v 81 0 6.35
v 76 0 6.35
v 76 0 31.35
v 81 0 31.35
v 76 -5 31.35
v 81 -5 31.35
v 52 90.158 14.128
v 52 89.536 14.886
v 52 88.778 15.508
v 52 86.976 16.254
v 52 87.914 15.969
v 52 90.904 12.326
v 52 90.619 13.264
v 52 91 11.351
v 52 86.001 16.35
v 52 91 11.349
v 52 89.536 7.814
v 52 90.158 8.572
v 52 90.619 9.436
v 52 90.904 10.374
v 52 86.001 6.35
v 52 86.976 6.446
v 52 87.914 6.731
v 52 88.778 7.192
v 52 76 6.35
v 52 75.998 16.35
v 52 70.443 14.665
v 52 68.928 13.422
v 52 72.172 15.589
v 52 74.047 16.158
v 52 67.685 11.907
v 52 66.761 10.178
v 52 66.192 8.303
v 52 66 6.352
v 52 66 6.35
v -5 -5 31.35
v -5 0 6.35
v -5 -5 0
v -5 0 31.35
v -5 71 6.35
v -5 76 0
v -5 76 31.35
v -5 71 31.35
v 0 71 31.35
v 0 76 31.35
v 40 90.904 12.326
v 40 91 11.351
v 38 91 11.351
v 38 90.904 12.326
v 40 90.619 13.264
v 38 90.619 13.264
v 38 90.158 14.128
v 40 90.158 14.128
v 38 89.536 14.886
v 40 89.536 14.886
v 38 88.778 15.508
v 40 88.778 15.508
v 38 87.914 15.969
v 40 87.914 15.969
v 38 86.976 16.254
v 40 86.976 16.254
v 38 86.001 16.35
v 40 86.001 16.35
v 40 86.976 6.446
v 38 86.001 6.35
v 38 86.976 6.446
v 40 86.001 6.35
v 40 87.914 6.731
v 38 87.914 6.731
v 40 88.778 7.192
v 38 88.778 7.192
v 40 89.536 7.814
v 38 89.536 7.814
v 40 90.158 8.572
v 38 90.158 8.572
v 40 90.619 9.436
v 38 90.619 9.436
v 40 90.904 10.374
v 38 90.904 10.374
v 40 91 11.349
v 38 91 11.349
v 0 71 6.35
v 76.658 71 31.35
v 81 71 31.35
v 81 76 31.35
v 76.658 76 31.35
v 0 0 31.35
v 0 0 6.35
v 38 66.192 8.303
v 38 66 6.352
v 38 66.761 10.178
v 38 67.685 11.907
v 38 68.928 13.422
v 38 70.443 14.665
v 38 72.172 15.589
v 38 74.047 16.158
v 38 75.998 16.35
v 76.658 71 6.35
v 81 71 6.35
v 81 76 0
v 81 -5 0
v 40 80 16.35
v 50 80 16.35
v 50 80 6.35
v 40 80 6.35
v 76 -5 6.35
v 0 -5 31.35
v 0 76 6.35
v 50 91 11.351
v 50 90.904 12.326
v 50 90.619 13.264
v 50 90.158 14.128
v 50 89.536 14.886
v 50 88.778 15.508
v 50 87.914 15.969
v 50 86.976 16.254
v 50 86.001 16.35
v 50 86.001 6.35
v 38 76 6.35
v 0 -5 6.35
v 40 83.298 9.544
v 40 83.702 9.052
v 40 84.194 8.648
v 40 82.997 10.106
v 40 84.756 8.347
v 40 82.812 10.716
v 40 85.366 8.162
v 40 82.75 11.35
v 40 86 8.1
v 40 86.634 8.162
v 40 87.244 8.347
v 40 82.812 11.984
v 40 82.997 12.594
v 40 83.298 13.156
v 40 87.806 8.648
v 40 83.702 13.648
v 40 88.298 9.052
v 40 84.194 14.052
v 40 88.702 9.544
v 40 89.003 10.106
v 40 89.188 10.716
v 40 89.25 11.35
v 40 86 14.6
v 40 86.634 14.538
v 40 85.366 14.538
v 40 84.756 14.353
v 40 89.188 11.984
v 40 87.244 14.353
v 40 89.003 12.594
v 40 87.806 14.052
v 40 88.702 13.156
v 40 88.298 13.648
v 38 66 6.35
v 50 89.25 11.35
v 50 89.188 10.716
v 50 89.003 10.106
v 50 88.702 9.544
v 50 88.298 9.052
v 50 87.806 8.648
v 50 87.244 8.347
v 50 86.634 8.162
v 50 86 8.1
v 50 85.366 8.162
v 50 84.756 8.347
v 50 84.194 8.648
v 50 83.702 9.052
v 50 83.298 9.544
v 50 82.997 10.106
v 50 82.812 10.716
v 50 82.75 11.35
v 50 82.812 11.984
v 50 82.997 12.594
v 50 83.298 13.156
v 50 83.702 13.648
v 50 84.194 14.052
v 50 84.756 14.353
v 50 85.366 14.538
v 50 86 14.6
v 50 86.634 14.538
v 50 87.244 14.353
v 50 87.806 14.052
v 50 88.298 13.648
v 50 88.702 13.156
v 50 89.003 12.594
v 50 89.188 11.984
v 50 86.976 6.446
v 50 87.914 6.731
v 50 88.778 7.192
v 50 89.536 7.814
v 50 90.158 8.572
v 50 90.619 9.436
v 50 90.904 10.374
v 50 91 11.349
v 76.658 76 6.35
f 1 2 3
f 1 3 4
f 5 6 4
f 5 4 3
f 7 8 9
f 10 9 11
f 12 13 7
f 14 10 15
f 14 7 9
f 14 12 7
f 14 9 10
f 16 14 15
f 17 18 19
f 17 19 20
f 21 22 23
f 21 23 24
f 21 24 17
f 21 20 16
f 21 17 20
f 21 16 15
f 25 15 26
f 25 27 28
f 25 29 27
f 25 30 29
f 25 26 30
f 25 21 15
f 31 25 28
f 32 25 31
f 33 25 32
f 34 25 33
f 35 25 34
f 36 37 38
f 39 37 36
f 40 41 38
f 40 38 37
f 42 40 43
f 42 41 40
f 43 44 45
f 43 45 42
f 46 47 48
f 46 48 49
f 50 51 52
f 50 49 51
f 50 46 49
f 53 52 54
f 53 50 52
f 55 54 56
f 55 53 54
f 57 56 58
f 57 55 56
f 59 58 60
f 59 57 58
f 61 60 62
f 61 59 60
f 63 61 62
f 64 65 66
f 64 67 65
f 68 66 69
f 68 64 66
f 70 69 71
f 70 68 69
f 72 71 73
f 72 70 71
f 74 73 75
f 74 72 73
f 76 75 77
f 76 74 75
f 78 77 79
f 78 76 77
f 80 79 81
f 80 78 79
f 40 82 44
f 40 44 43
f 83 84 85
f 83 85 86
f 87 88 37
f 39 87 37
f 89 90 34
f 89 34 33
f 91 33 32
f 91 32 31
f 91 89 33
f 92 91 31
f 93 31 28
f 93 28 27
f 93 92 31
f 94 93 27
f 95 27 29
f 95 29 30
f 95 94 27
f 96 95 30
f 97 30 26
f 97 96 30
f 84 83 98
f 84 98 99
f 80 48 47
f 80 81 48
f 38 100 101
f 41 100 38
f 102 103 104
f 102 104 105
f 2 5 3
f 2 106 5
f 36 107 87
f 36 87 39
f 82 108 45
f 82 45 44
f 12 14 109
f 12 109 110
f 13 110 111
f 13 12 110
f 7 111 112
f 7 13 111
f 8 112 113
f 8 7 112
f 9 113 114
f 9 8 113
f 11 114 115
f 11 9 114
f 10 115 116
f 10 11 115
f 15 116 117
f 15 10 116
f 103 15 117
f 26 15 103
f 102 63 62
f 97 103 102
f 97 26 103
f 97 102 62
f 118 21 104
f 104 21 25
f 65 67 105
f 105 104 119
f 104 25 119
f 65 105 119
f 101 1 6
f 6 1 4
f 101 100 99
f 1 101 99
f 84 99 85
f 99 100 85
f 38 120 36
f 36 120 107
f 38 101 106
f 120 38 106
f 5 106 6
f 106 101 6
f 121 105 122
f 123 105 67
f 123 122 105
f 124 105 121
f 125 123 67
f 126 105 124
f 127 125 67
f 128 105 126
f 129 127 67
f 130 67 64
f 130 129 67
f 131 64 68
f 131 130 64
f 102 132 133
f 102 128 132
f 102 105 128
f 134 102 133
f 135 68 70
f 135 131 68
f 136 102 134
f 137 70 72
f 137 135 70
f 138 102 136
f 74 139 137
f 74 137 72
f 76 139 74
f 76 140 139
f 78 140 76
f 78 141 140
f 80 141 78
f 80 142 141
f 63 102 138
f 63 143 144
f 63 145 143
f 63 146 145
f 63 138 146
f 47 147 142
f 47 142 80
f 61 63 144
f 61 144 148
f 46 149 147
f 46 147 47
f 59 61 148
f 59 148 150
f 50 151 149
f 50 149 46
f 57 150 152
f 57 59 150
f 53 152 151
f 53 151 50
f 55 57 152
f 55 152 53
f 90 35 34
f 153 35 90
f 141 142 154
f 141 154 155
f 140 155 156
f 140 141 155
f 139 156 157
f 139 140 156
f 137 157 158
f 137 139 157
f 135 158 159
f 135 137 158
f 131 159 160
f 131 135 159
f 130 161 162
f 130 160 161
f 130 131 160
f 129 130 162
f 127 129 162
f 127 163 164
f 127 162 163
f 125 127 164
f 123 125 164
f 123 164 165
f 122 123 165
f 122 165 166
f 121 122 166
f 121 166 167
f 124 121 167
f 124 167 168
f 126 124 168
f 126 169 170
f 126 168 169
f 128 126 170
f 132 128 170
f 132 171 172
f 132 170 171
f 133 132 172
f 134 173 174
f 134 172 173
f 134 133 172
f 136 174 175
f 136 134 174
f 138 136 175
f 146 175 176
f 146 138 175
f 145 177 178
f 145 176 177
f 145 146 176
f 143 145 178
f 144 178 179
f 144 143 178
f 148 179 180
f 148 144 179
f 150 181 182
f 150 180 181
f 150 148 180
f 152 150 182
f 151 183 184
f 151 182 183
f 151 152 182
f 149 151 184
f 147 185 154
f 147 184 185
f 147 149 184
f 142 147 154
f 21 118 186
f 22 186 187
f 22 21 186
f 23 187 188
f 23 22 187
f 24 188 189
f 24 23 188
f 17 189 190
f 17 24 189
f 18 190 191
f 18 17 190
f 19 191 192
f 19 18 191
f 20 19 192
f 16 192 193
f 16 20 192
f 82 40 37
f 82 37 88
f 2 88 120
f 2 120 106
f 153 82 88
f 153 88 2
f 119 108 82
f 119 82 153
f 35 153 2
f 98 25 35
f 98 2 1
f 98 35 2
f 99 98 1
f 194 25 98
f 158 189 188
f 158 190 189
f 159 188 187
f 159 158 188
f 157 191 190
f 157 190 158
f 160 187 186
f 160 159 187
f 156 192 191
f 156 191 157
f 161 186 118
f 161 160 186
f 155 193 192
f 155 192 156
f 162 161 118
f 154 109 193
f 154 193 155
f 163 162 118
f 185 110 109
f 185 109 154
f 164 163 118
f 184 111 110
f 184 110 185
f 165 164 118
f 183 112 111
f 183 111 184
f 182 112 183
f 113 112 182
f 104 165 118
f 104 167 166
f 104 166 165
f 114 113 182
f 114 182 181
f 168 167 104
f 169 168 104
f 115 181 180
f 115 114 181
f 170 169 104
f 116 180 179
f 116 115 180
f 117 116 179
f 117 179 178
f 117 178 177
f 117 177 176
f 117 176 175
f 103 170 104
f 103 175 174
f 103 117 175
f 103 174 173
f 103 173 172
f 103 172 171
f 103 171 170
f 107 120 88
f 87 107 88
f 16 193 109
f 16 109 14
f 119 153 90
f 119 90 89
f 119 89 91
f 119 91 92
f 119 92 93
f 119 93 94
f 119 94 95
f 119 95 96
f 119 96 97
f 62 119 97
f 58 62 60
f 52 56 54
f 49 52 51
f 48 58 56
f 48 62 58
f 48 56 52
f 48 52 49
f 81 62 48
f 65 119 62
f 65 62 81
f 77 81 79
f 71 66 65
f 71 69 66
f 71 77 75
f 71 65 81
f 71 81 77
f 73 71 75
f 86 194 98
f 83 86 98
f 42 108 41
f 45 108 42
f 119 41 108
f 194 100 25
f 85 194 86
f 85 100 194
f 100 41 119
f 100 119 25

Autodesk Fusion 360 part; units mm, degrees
sketch "Sketch1" plane through (0, 0, 0) normal (0, 0, 1) x (1, 0, 0)
  line L0 (0, 0) -> (76, 0)
  line L1 (76, 0) -> (76, 76)
  line L2 (76, 76) -> (0, 76)
  line L3 (0, 76) -> (0, 0)
  dimension "d1" = 76
  dimension "d2" = 76
extrude "Extrude1" add sketch "Sketch1" along normal blind 6.35
sketch "Sketch2" plane through (0, 0, 6.35) normal (0, 0, 1) x (-1, 0, 0)
  line L0 (0, -76) -> (0, 0)
  line L1 (0, 0) -> (-76, 0)
  line L2 (-76, 0) -> (-76, -76)
  line L3 (-76, -76) -> (0, -76)
  line L4 (-52, -66) -> (-38, -66)
  line L5 (-38, -66) -> (-38, -91)
  line L6 (-38, -91) -> (-52, -91)
  line L7 (-52, -91) -> (-52, -66)
  dimension "d5" = 14
  dimension "d6" = 25
  dimension "d7" = 24
  dimension "d8" = 10
extrude "Extrude2" add sketch "Sketch2" along normal blind 10 contours L3 L5 L6 L7 | L3 L4 L5 L7
fillet "Fillet1" radius 10 1 edges at (45, 66, 16.35)
fillet "Fillet2" radius 5 2 edges at (45, 91, 16.35) (45, 91, 6.35)
sketch "Sketch3" plane through (0, 0, 16.35) normal (0, 0, 1) x (-1, 0, 0)
  line L0 (-52, -86) -> (-38, -86)
  line L1 (-38, -86) -> (-38, -76)
  line L2 (-38, -76) -> (-52, -76)
  line L3 (-52, -76) -> (-52, -86)
  line L4 (-50, -80) -> (-40, -80)
  line L5 (-40, -80) -> (-40, -95)
  line L6 (-40, -95) -> (-50, -95)
  line L7 (-50, -95) -> (-50, -80)
extrude "Extrude3" cut sketch "Sketch3" against normal blind 20 contours L0 L4 L5 L7 | L0 L5 L6 L7
sketch "Sketch4" plane through (40, 0, 0) normal (1, 0, 0) x (0, 1, 0)
  line L0 (80, 6.35) -> (86, 6.35)
  arc A0 (86, 6.35) -> (86, 16.35) centre (86, 11.35) ccw
  line L1 (86, 16.35) -> (80, 16.35)
  line L2 (80, 16.35) -> (80, 6.35)
  circle A1 centre (86, 11.35) radius 3.25
  dimension "d17" = 6.5
extrude "Extrude4" add sketch "Sketch4" along normal blind 10 contours A1
extrude "Extrude5" add 1 faces at (76, 25.3333, 2.1167) along direction (1, 0, 0) blind 5
extrude "Extrude6" add 1 faces at (0, 50.6667, 2.1167) along direction (-1, 0, 0) blind 5
extrude "Extrude7" add 1 faces at (23.6667, 0, 2.1167) along direction (0, -1, 0) blind 5
sketch "Sketch5" plane through (0, 0, 6.35) normal (0, 0, 1) x (-1, 0, 0)
  line L0 (-38, -66) -> (-38, -76)
  line L1 (-38, -76) -> (5, -76)
  line L2 (5, -76) -> (5, 5)
  line L3 (5, 5) -> (-81, 5)
  line L4 (-81, 5) -> (-81, -76)
  line L5 (-81, -76) -> (-52, -76)
  line L6 (-52, -76) -> (-52, -66)
  line L7 (-52, -66) -> (-38, -66)
  line L8 (-81, -76) -> (-76.6575, -76)
  line L9 (-76.6575, -76) -> (-76.6575, -71)
  line L10 (-76.6575, -71) -> (-81, -71)
  line L11 (-81, -71) -> (-81, -76)
  line L12 (5, -76) -> (0, -76)
  line L13 (0, -76) -> (0, -71)
  line L14 (0, -71) -> (5, -71)
  line L15 (5, -71) -> (5, -76)
  line L16 (5, 5) -> (0, 5)
  line L17 (0, 5) -> (0, 0)
  line L18 (0, 0) -> (5, 0)
  line L19 (5, 0) -> (5, 5)
  line L20 (-81, 5) -> (-76, 5)
  line L21 (-76, 5) -> (-76, 0)
  line L22 (-76, 0) -> (-81, 0)
  line L23 (-81, 0) -> (-81, 5)
  dimension "d26" = 5
  dimension "d27" = 5
  dimension "d28" = 5
  dimension "d29" = 5
  dimension "d30" = 5
  dimension "d31" = 5
  dimension "d32" = 5
extrude "Extrude8" add sketch "Sketch5" along normal blind 25 contours L1 L2 L12 L13 L14 L15 | L4 L5 L8 L9 L10 L11 | L2 L3 L16 L17 L18 L19 | L3 L4 L20 L21 L22 L23
